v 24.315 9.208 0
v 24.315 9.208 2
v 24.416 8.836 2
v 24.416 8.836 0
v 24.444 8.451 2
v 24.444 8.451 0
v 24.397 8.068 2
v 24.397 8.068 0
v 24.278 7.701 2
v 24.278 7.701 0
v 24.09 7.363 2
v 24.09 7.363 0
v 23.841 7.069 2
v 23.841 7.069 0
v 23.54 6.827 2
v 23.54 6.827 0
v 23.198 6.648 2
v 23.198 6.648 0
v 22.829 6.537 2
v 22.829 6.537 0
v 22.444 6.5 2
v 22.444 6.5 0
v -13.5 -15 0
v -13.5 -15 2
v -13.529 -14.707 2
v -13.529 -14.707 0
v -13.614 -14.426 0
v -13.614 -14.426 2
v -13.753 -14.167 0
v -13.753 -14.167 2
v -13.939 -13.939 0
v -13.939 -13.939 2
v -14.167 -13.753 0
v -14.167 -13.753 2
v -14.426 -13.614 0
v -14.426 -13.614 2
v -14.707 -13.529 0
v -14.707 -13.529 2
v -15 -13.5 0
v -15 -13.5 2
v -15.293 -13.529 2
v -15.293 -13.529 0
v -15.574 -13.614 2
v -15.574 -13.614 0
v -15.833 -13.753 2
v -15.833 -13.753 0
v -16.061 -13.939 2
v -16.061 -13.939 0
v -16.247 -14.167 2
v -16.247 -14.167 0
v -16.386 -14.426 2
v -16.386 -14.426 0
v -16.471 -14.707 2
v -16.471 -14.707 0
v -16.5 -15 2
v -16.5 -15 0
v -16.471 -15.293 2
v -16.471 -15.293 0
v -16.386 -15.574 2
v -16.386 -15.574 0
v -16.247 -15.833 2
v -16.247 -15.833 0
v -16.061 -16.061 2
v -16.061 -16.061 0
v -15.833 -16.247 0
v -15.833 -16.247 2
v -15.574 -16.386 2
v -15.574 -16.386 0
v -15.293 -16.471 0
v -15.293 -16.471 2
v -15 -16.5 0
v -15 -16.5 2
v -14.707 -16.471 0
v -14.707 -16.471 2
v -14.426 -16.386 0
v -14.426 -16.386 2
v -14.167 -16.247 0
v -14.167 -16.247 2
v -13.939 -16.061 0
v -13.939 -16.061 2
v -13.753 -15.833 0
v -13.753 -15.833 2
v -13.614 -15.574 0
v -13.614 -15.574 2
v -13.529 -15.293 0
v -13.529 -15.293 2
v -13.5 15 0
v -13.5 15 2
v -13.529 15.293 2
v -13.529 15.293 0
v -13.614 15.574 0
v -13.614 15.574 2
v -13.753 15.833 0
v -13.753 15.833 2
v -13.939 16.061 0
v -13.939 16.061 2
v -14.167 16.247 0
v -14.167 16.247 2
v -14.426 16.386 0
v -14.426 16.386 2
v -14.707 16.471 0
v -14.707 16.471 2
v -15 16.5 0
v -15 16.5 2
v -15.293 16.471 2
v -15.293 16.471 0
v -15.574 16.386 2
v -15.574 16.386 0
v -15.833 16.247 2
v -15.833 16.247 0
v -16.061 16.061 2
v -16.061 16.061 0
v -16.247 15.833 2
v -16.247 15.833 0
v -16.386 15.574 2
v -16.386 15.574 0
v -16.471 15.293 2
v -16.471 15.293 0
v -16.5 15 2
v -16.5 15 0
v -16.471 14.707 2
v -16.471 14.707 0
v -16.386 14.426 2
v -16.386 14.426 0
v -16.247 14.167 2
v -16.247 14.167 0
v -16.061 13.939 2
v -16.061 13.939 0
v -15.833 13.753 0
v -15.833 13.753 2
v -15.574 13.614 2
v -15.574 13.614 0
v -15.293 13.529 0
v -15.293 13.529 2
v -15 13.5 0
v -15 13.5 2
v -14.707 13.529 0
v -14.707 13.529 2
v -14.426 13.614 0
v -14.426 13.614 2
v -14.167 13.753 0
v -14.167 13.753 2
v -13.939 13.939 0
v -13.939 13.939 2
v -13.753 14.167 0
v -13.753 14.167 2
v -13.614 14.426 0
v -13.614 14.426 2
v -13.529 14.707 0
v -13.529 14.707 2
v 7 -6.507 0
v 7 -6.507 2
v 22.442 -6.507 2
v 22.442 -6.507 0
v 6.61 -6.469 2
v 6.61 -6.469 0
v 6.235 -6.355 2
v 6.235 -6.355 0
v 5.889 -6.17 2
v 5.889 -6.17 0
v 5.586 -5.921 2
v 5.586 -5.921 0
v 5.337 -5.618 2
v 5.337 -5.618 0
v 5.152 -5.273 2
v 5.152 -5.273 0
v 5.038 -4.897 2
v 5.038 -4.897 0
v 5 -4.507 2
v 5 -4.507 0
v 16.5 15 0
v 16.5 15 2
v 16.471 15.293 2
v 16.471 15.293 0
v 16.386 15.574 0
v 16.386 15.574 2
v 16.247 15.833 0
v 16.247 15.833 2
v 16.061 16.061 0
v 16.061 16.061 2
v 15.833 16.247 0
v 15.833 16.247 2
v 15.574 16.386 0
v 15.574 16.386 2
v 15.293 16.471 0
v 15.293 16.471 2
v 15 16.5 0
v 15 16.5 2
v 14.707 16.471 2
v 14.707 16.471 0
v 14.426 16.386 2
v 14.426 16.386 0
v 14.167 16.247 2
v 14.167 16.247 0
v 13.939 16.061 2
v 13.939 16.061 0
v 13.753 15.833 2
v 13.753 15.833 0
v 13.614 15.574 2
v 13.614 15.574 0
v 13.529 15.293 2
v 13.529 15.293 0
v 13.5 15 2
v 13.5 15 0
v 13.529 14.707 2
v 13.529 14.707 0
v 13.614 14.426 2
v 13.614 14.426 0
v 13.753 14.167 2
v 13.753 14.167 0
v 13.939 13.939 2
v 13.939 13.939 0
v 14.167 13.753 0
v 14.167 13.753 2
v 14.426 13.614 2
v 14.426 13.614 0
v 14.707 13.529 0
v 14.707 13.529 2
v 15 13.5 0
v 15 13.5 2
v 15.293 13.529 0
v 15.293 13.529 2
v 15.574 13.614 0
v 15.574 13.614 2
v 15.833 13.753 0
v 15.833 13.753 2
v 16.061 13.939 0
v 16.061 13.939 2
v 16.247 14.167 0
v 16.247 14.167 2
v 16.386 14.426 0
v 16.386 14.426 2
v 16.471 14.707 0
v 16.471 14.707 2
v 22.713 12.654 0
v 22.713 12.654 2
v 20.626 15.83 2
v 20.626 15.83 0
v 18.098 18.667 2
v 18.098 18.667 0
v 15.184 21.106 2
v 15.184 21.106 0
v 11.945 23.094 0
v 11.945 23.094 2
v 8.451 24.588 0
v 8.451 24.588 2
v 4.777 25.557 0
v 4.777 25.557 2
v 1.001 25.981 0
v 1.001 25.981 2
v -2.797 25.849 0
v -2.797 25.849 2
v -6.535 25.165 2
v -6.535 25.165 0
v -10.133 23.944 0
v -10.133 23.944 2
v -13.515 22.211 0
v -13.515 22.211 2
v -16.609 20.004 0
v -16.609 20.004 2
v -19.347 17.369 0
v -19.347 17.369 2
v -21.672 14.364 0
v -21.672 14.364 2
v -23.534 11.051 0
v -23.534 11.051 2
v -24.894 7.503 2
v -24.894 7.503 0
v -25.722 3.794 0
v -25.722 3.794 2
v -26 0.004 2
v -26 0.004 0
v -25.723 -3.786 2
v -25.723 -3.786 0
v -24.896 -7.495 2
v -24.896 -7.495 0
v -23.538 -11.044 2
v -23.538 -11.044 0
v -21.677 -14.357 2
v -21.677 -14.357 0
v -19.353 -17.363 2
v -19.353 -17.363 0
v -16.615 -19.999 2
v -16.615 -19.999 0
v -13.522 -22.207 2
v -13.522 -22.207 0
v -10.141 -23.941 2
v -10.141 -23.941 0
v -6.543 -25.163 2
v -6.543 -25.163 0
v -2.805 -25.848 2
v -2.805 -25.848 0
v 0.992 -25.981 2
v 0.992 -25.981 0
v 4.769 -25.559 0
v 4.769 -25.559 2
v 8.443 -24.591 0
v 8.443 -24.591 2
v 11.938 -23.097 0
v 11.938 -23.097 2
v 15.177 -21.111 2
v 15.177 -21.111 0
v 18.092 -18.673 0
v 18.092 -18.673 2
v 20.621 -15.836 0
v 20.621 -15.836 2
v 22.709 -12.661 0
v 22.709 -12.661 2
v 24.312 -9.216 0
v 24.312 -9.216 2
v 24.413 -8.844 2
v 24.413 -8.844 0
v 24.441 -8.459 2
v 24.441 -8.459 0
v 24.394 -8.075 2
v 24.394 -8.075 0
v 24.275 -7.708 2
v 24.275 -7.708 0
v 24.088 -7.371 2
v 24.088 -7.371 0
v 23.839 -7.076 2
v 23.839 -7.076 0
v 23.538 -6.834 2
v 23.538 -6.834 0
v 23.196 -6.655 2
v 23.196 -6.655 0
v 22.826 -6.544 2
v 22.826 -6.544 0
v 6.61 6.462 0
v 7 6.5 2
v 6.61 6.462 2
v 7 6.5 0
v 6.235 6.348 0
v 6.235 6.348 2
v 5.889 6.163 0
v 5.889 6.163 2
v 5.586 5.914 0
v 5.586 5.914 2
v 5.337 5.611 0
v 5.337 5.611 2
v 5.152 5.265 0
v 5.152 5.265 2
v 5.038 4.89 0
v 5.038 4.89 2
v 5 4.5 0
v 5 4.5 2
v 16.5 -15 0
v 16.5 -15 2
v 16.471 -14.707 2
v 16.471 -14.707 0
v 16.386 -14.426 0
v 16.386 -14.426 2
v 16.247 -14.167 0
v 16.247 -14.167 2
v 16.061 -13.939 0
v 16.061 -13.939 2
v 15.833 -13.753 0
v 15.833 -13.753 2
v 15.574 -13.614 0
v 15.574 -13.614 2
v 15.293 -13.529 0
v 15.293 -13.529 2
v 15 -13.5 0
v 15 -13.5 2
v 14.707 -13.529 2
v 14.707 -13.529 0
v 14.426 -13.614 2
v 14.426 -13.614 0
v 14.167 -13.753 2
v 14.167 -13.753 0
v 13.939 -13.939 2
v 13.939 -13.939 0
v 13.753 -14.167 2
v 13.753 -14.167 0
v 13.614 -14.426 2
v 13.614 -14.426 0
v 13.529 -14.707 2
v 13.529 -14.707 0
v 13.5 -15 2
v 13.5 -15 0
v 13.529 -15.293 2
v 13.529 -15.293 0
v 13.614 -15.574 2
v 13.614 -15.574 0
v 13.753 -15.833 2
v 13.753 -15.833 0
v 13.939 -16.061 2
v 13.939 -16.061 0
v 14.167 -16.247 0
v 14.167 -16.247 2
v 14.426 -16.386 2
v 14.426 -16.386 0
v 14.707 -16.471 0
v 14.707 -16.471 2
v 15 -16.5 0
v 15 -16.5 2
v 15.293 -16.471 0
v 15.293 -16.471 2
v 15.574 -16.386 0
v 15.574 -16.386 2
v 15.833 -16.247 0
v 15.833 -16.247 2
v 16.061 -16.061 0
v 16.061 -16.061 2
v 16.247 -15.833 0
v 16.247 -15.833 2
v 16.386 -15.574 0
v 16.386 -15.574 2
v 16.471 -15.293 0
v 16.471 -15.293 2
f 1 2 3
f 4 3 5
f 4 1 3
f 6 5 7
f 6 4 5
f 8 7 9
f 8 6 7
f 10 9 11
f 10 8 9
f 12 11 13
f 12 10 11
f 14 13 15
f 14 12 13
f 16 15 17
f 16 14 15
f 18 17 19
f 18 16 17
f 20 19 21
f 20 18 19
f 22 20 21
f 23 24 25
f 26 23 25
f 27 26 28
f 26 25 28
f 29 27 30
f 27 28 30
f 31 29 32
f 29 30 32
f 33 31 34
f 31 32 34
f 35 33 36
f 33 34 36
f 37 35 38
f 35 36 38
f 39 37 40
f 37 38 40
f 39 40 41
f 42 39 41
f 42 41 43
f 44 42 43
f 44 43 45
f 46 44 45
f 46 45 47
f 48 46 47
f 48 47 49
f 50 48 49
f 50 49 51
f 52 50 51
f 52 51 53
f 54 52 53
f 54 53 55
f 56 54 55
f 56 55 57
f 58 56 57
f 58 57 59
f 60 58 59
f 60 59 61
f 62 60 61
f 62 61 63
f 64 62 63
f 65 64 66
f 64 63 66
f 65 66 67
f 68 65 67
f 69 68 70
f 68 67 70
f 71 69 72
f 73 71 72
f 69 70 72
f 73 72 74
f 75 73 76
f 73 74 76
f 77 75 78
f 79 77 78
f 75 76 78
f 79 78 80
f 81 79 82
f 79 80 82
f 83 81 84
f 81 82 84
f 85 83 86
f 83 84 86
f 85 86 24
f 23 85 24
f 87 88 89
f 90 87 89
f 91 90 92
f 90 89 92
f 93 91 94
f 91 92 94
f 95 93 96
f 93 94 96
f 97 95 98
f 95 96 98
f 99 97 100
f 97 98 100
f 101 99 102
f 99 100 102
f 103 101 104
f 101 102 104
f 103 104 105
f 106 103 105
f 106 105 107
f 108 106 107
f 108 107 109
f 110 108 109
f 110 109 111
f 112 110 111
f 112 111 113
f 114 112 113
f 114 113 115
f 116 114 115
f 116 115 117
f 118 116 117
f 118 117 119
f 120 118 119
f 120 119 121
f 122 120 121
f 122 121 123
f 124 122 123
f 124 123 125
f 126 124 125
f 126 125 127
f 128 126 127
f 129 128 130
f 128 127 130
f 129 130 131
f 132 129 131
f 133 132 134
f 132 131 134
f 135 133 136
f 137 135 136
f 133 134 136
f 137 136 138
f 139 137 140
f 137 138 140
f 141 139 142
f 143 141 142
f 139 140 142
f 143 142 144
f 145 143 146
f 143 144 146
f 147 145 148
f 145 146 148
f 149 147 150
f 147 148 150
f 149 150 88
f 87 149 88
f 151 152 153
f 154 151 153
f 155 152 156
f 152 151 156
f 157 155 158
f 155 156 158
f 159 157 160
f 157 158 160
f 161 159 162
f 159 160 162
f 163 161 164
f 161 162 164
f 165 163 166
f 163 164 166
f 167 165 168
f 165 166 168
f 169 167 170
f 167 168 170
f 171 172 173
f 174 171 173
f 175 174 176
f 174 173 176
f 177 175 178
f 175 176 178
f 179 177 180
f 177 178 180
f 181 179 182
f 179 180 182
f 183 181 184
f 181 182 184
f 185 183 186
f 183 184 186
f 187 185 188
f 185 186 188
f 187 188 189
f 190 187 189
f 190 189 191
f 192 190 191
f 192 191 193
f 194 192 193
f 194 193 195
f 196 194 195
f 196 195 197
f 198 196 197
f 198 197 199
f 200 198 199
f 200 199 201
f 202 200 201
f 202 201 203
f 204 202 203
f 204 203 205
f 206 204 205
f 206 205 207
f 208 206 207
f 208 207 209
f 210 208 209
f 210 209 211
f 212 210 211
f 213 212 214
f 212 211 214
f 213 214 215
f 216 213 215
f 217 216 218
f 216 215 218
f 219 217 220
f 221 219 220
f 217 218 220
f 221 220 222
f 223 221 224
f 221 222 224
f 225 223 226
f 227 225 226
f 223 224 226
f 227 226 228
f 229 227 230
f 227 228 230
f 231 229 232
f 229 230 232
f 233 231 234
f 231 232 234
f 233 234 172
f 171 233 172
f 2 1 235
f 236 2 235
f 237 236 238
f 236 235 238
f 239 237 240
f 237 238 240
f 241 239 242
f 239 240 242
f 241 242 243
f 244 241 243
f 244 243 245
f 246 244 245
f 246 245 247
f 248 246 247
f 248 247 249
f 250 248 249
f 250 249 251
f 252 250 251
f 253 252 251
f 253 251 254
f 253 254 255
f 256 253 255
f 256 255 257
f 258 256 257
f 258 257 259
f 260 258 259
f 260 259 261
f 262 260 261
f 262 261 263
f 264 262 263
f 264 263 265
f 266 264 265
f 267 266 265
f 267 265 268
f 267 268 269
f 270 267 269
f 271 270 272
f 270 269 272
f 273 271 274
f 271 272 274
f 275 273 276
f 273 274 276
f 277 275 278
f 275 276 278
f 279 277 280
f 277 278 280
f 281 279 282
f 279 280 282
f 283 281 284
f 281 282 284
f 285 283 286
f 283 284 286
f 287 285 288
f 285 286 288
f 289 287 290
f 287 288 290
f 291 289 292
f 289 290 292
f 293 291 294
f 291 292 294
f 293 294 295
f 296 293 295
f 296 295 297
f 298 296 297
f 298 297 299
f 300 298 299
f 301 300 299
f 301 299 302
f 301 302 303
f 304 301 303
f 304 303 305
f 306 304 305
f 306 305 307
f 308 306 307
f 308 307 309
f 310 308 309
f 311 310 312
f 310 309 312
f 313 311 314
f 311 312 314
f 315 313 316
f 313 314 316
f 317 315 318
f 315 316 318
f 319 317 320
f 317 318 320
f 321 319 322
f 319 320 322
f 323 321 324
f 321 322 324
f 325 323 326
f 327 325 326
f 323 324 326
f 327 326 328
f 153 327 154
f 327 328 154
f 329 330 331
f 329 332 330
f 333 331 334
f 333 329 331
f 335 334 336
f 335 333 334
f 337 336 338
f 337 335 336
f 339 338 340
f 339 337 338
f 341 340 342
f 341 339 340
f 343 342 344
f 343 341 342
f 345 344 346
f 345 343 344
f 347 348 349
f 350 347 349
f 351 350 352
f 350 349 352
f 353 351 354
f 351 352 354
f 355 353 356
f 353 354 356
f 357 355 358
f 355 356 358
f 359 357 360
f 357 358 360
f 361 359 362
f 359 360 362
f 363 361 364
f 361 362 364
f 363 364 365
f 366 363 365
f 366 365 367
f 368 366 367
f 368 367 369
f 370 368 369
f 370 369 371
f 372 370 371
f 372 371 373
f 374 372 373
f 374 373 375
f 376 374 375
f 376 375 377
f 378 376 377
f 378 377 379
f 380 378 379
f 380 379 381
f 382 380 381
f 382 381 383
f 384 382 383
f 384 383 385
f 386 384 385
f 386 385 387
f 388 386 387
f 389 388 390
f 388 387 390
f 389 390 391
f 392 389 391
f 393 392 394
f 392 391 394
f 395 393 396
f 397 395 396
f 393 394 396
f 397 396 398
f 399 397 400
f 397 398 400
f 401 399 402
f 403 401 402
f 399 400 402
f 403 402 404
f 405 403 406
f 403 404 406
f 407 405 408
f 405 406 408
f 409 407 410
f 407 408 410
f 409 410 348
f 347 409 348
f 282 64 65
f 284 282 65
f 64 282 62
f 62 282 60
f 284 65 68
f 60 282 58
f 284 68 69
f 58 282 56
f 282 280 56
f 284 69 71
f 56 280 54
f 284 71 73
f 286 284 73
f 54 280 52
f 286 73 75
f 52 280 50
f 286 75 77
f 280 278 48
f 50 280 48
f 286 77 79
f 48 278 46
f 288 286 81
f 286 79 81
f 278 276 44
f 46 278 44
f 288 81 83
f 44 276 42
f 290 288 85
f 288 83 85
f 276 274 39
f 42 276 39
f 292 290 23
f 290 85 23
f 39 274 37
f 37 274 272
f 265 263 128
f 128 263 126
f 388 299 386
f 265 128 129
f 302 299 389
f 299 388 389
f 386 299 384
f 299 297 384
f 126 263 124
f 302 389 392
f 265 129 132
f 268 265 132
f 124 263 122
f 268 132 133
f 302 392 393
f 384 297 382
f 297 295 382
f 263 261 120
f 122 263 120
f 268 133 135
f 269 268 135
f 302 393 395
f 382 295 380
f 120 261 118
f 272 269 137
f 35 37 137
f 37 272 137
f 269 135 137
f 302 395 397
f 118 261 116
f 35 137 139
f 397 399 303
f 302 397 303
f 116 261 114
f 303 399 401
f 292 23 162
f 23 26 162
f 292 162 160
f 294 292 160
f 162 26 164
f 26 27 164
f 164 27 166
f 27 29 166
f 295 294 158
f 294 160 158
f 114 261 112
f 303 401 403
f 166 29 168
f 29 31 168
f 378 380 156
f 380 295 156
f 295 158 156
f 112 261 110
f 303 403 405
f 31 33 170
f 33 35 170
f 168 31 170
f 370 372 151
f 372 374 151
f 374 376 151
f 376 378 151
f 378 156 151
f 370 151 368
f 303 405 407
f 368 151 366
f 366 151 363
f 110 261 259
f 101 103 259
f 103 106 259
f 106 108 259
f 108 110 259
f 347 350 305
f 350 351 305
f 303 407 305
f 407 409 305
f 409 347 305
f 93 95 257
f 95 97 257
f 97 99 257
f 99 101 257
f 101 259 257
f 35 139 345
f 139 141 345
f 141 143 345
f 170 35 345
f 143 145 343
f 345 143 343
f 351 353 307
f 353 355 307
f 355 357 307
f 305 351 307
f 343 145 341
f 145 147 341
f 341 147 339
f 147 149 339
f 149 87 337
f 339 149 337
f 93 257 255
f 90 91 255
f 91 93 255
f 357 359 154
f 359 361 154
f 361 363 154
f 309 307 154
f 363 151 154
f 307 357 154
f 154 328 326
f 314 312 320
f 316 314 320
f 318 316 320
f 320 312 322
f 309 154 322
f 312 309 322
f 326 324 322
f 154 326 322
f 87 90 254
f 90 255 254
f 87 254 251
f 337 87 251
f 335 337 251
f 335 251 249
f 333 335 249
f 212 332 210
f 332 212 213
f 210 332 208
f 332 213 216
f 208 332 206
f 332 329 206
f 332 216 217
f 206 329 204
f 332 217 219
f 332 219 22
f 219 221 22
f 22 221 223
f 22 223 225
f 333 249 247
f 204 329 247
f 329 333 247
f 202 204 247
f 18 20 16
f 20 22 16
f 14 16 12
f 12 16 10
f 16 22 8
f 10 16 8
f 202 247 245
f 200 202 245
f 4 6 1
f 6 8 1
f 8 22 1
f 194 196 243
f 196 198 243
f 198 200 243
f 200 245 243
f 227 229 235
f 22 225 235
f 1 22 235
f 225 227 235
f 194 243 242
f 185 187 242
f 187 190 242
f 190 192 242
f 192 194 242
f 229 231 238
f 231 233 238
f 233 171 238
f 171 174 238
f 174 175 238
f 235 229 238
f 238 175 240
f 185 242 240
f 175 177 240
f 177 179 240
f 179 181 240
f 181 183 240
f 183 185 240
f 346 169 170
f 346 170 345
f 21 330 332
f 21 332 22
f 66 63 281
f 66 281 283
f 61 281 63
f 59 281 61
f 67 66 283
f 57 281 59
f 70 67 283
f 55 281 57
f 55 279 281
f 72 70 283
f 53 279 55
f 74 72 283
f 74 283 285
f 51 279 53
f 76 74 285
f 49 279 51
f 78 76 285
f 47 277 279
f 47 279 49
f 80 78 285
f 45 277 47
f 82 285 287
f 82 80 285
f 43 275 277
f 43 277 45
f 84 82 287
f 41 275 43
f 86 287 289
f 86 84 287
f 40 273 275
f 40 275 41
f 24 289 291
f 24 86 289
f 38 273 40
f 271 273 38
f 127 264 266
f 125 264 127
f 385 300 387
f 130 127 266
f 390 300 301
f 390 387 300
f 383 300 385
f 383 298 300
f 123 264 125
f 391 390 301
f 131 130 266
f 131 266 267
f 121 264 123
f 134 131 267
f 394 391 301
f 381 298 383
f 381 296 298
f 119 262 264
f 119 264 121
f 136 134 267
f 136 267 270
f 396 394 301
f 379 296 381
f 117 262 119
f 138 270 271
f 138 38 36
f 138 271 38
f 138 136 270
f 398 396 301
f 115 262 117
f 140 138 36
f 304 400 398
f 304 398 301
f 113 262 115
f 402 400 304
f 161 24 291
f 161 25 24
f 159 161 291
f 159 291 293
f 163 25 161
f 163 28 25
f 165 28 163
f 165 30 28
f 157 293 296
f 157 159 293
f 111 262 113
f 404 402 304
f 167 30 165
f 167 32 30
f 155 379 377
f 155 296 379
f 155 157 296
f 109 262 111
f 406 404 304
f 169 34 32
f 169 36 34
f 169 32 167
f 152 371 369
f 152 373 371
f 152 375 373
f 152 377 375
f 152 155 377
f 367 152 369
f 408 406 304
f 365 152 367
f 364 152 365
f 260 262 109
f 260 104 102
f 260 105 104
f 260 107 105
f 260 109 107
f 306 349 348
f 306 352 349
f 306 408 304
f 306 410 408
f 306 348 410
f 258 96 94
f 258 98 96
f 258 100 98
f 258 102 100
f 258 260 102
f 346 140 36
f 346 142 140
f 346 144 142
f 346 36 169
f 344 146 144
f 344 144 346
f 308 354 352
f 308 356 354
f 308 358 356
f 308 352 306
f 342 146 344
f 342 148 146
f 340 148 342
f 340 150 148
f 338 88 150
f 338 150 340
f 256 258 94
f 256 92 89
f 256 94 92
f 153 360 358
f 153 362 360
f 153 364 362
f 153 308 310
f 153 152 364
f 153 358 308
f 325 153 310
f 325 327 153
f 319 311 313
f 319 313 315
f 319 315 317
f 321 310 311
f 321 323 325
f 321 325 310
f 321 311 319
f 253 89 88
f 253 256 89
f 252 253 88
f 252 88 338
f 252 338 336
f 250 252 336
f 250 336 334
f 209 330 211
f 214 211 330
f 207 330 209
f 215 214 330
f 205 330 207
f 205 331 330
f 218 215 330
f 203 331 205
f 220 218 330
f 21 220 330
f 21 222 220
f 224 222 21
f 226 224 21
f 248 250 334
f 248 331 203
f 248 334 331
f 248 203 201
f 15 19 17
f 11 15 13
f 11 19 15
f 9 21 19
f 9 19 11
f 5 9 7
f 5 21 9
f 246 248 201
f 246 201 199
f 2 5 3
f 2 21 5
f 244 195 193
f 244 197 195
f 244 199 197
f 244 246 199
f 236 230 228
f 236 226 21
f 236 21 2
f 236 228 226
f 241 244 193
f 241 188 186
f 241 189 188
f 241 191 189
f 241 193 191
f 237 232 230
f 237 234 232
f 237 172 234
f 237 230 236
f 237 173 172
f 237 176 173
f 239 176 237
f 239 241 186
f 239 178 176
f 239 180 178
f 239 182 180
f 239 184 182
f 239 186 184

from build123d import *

# Parameters (mm, degrees)
SKETCH_R        = 25.999973
PAD_DEPTH       = 2
SKETCH001_R     = 1.5
POCKET_DEPTH    = 2.001
SKETCH002_W     = 21
SKETCH002_H     = 13.007144
POCKET001_DEPTH = 5
FILLET_R        = 2


with BuildPart() as part:
    # Sketch → Pad (new body)
    with BuildSketch(Plane.XY):
        Circle(SKETCH_R)
    extrude(amount=PAD_DEPTH)

    # Sketch001 (on Face3 of Pad) → Pocket (cut, through all)
    with BuildSketch(Plane.XY.offset(2)):
        with Locations((-15, 15)):
            Circle(SKETCH001_R)
        with Locations((15, 15)):
            Circle(SKETCH001_R)
        with Locations((15, -15)):
            Circle(SKETCH001_R)
        with Locations((-15, -15)):
            Circle(SKETCH001_R)
    extrude(amount=-POCKET_DEPTH, mode=Mode.SUBTRACT)

    # Sketch002 (on Face3 of Pocket) → Pocket001 (cut)
    with BuildSketch(Plane.XY.offset(2)):
        with Locations((15.5, -0.003572)):
            Rectangle(SKETCH002_W, SKETCH002_H)
    extrude(amount=-POCKET001_DEPTH, mode=Mode.SUBTRACT)

    # Fillet
    fillet_edges = [part.edges().sort_by_distance(p)[0] for p in [
        (5, 6.5, 1),
        (5, -6.507144, 1),
        (25.172518, -6.507144, 1),
        (25.174364, 6.5, 1),
    ]]
    fillet(fillet_edges, radius=FILLET_R)


solid = part.part
